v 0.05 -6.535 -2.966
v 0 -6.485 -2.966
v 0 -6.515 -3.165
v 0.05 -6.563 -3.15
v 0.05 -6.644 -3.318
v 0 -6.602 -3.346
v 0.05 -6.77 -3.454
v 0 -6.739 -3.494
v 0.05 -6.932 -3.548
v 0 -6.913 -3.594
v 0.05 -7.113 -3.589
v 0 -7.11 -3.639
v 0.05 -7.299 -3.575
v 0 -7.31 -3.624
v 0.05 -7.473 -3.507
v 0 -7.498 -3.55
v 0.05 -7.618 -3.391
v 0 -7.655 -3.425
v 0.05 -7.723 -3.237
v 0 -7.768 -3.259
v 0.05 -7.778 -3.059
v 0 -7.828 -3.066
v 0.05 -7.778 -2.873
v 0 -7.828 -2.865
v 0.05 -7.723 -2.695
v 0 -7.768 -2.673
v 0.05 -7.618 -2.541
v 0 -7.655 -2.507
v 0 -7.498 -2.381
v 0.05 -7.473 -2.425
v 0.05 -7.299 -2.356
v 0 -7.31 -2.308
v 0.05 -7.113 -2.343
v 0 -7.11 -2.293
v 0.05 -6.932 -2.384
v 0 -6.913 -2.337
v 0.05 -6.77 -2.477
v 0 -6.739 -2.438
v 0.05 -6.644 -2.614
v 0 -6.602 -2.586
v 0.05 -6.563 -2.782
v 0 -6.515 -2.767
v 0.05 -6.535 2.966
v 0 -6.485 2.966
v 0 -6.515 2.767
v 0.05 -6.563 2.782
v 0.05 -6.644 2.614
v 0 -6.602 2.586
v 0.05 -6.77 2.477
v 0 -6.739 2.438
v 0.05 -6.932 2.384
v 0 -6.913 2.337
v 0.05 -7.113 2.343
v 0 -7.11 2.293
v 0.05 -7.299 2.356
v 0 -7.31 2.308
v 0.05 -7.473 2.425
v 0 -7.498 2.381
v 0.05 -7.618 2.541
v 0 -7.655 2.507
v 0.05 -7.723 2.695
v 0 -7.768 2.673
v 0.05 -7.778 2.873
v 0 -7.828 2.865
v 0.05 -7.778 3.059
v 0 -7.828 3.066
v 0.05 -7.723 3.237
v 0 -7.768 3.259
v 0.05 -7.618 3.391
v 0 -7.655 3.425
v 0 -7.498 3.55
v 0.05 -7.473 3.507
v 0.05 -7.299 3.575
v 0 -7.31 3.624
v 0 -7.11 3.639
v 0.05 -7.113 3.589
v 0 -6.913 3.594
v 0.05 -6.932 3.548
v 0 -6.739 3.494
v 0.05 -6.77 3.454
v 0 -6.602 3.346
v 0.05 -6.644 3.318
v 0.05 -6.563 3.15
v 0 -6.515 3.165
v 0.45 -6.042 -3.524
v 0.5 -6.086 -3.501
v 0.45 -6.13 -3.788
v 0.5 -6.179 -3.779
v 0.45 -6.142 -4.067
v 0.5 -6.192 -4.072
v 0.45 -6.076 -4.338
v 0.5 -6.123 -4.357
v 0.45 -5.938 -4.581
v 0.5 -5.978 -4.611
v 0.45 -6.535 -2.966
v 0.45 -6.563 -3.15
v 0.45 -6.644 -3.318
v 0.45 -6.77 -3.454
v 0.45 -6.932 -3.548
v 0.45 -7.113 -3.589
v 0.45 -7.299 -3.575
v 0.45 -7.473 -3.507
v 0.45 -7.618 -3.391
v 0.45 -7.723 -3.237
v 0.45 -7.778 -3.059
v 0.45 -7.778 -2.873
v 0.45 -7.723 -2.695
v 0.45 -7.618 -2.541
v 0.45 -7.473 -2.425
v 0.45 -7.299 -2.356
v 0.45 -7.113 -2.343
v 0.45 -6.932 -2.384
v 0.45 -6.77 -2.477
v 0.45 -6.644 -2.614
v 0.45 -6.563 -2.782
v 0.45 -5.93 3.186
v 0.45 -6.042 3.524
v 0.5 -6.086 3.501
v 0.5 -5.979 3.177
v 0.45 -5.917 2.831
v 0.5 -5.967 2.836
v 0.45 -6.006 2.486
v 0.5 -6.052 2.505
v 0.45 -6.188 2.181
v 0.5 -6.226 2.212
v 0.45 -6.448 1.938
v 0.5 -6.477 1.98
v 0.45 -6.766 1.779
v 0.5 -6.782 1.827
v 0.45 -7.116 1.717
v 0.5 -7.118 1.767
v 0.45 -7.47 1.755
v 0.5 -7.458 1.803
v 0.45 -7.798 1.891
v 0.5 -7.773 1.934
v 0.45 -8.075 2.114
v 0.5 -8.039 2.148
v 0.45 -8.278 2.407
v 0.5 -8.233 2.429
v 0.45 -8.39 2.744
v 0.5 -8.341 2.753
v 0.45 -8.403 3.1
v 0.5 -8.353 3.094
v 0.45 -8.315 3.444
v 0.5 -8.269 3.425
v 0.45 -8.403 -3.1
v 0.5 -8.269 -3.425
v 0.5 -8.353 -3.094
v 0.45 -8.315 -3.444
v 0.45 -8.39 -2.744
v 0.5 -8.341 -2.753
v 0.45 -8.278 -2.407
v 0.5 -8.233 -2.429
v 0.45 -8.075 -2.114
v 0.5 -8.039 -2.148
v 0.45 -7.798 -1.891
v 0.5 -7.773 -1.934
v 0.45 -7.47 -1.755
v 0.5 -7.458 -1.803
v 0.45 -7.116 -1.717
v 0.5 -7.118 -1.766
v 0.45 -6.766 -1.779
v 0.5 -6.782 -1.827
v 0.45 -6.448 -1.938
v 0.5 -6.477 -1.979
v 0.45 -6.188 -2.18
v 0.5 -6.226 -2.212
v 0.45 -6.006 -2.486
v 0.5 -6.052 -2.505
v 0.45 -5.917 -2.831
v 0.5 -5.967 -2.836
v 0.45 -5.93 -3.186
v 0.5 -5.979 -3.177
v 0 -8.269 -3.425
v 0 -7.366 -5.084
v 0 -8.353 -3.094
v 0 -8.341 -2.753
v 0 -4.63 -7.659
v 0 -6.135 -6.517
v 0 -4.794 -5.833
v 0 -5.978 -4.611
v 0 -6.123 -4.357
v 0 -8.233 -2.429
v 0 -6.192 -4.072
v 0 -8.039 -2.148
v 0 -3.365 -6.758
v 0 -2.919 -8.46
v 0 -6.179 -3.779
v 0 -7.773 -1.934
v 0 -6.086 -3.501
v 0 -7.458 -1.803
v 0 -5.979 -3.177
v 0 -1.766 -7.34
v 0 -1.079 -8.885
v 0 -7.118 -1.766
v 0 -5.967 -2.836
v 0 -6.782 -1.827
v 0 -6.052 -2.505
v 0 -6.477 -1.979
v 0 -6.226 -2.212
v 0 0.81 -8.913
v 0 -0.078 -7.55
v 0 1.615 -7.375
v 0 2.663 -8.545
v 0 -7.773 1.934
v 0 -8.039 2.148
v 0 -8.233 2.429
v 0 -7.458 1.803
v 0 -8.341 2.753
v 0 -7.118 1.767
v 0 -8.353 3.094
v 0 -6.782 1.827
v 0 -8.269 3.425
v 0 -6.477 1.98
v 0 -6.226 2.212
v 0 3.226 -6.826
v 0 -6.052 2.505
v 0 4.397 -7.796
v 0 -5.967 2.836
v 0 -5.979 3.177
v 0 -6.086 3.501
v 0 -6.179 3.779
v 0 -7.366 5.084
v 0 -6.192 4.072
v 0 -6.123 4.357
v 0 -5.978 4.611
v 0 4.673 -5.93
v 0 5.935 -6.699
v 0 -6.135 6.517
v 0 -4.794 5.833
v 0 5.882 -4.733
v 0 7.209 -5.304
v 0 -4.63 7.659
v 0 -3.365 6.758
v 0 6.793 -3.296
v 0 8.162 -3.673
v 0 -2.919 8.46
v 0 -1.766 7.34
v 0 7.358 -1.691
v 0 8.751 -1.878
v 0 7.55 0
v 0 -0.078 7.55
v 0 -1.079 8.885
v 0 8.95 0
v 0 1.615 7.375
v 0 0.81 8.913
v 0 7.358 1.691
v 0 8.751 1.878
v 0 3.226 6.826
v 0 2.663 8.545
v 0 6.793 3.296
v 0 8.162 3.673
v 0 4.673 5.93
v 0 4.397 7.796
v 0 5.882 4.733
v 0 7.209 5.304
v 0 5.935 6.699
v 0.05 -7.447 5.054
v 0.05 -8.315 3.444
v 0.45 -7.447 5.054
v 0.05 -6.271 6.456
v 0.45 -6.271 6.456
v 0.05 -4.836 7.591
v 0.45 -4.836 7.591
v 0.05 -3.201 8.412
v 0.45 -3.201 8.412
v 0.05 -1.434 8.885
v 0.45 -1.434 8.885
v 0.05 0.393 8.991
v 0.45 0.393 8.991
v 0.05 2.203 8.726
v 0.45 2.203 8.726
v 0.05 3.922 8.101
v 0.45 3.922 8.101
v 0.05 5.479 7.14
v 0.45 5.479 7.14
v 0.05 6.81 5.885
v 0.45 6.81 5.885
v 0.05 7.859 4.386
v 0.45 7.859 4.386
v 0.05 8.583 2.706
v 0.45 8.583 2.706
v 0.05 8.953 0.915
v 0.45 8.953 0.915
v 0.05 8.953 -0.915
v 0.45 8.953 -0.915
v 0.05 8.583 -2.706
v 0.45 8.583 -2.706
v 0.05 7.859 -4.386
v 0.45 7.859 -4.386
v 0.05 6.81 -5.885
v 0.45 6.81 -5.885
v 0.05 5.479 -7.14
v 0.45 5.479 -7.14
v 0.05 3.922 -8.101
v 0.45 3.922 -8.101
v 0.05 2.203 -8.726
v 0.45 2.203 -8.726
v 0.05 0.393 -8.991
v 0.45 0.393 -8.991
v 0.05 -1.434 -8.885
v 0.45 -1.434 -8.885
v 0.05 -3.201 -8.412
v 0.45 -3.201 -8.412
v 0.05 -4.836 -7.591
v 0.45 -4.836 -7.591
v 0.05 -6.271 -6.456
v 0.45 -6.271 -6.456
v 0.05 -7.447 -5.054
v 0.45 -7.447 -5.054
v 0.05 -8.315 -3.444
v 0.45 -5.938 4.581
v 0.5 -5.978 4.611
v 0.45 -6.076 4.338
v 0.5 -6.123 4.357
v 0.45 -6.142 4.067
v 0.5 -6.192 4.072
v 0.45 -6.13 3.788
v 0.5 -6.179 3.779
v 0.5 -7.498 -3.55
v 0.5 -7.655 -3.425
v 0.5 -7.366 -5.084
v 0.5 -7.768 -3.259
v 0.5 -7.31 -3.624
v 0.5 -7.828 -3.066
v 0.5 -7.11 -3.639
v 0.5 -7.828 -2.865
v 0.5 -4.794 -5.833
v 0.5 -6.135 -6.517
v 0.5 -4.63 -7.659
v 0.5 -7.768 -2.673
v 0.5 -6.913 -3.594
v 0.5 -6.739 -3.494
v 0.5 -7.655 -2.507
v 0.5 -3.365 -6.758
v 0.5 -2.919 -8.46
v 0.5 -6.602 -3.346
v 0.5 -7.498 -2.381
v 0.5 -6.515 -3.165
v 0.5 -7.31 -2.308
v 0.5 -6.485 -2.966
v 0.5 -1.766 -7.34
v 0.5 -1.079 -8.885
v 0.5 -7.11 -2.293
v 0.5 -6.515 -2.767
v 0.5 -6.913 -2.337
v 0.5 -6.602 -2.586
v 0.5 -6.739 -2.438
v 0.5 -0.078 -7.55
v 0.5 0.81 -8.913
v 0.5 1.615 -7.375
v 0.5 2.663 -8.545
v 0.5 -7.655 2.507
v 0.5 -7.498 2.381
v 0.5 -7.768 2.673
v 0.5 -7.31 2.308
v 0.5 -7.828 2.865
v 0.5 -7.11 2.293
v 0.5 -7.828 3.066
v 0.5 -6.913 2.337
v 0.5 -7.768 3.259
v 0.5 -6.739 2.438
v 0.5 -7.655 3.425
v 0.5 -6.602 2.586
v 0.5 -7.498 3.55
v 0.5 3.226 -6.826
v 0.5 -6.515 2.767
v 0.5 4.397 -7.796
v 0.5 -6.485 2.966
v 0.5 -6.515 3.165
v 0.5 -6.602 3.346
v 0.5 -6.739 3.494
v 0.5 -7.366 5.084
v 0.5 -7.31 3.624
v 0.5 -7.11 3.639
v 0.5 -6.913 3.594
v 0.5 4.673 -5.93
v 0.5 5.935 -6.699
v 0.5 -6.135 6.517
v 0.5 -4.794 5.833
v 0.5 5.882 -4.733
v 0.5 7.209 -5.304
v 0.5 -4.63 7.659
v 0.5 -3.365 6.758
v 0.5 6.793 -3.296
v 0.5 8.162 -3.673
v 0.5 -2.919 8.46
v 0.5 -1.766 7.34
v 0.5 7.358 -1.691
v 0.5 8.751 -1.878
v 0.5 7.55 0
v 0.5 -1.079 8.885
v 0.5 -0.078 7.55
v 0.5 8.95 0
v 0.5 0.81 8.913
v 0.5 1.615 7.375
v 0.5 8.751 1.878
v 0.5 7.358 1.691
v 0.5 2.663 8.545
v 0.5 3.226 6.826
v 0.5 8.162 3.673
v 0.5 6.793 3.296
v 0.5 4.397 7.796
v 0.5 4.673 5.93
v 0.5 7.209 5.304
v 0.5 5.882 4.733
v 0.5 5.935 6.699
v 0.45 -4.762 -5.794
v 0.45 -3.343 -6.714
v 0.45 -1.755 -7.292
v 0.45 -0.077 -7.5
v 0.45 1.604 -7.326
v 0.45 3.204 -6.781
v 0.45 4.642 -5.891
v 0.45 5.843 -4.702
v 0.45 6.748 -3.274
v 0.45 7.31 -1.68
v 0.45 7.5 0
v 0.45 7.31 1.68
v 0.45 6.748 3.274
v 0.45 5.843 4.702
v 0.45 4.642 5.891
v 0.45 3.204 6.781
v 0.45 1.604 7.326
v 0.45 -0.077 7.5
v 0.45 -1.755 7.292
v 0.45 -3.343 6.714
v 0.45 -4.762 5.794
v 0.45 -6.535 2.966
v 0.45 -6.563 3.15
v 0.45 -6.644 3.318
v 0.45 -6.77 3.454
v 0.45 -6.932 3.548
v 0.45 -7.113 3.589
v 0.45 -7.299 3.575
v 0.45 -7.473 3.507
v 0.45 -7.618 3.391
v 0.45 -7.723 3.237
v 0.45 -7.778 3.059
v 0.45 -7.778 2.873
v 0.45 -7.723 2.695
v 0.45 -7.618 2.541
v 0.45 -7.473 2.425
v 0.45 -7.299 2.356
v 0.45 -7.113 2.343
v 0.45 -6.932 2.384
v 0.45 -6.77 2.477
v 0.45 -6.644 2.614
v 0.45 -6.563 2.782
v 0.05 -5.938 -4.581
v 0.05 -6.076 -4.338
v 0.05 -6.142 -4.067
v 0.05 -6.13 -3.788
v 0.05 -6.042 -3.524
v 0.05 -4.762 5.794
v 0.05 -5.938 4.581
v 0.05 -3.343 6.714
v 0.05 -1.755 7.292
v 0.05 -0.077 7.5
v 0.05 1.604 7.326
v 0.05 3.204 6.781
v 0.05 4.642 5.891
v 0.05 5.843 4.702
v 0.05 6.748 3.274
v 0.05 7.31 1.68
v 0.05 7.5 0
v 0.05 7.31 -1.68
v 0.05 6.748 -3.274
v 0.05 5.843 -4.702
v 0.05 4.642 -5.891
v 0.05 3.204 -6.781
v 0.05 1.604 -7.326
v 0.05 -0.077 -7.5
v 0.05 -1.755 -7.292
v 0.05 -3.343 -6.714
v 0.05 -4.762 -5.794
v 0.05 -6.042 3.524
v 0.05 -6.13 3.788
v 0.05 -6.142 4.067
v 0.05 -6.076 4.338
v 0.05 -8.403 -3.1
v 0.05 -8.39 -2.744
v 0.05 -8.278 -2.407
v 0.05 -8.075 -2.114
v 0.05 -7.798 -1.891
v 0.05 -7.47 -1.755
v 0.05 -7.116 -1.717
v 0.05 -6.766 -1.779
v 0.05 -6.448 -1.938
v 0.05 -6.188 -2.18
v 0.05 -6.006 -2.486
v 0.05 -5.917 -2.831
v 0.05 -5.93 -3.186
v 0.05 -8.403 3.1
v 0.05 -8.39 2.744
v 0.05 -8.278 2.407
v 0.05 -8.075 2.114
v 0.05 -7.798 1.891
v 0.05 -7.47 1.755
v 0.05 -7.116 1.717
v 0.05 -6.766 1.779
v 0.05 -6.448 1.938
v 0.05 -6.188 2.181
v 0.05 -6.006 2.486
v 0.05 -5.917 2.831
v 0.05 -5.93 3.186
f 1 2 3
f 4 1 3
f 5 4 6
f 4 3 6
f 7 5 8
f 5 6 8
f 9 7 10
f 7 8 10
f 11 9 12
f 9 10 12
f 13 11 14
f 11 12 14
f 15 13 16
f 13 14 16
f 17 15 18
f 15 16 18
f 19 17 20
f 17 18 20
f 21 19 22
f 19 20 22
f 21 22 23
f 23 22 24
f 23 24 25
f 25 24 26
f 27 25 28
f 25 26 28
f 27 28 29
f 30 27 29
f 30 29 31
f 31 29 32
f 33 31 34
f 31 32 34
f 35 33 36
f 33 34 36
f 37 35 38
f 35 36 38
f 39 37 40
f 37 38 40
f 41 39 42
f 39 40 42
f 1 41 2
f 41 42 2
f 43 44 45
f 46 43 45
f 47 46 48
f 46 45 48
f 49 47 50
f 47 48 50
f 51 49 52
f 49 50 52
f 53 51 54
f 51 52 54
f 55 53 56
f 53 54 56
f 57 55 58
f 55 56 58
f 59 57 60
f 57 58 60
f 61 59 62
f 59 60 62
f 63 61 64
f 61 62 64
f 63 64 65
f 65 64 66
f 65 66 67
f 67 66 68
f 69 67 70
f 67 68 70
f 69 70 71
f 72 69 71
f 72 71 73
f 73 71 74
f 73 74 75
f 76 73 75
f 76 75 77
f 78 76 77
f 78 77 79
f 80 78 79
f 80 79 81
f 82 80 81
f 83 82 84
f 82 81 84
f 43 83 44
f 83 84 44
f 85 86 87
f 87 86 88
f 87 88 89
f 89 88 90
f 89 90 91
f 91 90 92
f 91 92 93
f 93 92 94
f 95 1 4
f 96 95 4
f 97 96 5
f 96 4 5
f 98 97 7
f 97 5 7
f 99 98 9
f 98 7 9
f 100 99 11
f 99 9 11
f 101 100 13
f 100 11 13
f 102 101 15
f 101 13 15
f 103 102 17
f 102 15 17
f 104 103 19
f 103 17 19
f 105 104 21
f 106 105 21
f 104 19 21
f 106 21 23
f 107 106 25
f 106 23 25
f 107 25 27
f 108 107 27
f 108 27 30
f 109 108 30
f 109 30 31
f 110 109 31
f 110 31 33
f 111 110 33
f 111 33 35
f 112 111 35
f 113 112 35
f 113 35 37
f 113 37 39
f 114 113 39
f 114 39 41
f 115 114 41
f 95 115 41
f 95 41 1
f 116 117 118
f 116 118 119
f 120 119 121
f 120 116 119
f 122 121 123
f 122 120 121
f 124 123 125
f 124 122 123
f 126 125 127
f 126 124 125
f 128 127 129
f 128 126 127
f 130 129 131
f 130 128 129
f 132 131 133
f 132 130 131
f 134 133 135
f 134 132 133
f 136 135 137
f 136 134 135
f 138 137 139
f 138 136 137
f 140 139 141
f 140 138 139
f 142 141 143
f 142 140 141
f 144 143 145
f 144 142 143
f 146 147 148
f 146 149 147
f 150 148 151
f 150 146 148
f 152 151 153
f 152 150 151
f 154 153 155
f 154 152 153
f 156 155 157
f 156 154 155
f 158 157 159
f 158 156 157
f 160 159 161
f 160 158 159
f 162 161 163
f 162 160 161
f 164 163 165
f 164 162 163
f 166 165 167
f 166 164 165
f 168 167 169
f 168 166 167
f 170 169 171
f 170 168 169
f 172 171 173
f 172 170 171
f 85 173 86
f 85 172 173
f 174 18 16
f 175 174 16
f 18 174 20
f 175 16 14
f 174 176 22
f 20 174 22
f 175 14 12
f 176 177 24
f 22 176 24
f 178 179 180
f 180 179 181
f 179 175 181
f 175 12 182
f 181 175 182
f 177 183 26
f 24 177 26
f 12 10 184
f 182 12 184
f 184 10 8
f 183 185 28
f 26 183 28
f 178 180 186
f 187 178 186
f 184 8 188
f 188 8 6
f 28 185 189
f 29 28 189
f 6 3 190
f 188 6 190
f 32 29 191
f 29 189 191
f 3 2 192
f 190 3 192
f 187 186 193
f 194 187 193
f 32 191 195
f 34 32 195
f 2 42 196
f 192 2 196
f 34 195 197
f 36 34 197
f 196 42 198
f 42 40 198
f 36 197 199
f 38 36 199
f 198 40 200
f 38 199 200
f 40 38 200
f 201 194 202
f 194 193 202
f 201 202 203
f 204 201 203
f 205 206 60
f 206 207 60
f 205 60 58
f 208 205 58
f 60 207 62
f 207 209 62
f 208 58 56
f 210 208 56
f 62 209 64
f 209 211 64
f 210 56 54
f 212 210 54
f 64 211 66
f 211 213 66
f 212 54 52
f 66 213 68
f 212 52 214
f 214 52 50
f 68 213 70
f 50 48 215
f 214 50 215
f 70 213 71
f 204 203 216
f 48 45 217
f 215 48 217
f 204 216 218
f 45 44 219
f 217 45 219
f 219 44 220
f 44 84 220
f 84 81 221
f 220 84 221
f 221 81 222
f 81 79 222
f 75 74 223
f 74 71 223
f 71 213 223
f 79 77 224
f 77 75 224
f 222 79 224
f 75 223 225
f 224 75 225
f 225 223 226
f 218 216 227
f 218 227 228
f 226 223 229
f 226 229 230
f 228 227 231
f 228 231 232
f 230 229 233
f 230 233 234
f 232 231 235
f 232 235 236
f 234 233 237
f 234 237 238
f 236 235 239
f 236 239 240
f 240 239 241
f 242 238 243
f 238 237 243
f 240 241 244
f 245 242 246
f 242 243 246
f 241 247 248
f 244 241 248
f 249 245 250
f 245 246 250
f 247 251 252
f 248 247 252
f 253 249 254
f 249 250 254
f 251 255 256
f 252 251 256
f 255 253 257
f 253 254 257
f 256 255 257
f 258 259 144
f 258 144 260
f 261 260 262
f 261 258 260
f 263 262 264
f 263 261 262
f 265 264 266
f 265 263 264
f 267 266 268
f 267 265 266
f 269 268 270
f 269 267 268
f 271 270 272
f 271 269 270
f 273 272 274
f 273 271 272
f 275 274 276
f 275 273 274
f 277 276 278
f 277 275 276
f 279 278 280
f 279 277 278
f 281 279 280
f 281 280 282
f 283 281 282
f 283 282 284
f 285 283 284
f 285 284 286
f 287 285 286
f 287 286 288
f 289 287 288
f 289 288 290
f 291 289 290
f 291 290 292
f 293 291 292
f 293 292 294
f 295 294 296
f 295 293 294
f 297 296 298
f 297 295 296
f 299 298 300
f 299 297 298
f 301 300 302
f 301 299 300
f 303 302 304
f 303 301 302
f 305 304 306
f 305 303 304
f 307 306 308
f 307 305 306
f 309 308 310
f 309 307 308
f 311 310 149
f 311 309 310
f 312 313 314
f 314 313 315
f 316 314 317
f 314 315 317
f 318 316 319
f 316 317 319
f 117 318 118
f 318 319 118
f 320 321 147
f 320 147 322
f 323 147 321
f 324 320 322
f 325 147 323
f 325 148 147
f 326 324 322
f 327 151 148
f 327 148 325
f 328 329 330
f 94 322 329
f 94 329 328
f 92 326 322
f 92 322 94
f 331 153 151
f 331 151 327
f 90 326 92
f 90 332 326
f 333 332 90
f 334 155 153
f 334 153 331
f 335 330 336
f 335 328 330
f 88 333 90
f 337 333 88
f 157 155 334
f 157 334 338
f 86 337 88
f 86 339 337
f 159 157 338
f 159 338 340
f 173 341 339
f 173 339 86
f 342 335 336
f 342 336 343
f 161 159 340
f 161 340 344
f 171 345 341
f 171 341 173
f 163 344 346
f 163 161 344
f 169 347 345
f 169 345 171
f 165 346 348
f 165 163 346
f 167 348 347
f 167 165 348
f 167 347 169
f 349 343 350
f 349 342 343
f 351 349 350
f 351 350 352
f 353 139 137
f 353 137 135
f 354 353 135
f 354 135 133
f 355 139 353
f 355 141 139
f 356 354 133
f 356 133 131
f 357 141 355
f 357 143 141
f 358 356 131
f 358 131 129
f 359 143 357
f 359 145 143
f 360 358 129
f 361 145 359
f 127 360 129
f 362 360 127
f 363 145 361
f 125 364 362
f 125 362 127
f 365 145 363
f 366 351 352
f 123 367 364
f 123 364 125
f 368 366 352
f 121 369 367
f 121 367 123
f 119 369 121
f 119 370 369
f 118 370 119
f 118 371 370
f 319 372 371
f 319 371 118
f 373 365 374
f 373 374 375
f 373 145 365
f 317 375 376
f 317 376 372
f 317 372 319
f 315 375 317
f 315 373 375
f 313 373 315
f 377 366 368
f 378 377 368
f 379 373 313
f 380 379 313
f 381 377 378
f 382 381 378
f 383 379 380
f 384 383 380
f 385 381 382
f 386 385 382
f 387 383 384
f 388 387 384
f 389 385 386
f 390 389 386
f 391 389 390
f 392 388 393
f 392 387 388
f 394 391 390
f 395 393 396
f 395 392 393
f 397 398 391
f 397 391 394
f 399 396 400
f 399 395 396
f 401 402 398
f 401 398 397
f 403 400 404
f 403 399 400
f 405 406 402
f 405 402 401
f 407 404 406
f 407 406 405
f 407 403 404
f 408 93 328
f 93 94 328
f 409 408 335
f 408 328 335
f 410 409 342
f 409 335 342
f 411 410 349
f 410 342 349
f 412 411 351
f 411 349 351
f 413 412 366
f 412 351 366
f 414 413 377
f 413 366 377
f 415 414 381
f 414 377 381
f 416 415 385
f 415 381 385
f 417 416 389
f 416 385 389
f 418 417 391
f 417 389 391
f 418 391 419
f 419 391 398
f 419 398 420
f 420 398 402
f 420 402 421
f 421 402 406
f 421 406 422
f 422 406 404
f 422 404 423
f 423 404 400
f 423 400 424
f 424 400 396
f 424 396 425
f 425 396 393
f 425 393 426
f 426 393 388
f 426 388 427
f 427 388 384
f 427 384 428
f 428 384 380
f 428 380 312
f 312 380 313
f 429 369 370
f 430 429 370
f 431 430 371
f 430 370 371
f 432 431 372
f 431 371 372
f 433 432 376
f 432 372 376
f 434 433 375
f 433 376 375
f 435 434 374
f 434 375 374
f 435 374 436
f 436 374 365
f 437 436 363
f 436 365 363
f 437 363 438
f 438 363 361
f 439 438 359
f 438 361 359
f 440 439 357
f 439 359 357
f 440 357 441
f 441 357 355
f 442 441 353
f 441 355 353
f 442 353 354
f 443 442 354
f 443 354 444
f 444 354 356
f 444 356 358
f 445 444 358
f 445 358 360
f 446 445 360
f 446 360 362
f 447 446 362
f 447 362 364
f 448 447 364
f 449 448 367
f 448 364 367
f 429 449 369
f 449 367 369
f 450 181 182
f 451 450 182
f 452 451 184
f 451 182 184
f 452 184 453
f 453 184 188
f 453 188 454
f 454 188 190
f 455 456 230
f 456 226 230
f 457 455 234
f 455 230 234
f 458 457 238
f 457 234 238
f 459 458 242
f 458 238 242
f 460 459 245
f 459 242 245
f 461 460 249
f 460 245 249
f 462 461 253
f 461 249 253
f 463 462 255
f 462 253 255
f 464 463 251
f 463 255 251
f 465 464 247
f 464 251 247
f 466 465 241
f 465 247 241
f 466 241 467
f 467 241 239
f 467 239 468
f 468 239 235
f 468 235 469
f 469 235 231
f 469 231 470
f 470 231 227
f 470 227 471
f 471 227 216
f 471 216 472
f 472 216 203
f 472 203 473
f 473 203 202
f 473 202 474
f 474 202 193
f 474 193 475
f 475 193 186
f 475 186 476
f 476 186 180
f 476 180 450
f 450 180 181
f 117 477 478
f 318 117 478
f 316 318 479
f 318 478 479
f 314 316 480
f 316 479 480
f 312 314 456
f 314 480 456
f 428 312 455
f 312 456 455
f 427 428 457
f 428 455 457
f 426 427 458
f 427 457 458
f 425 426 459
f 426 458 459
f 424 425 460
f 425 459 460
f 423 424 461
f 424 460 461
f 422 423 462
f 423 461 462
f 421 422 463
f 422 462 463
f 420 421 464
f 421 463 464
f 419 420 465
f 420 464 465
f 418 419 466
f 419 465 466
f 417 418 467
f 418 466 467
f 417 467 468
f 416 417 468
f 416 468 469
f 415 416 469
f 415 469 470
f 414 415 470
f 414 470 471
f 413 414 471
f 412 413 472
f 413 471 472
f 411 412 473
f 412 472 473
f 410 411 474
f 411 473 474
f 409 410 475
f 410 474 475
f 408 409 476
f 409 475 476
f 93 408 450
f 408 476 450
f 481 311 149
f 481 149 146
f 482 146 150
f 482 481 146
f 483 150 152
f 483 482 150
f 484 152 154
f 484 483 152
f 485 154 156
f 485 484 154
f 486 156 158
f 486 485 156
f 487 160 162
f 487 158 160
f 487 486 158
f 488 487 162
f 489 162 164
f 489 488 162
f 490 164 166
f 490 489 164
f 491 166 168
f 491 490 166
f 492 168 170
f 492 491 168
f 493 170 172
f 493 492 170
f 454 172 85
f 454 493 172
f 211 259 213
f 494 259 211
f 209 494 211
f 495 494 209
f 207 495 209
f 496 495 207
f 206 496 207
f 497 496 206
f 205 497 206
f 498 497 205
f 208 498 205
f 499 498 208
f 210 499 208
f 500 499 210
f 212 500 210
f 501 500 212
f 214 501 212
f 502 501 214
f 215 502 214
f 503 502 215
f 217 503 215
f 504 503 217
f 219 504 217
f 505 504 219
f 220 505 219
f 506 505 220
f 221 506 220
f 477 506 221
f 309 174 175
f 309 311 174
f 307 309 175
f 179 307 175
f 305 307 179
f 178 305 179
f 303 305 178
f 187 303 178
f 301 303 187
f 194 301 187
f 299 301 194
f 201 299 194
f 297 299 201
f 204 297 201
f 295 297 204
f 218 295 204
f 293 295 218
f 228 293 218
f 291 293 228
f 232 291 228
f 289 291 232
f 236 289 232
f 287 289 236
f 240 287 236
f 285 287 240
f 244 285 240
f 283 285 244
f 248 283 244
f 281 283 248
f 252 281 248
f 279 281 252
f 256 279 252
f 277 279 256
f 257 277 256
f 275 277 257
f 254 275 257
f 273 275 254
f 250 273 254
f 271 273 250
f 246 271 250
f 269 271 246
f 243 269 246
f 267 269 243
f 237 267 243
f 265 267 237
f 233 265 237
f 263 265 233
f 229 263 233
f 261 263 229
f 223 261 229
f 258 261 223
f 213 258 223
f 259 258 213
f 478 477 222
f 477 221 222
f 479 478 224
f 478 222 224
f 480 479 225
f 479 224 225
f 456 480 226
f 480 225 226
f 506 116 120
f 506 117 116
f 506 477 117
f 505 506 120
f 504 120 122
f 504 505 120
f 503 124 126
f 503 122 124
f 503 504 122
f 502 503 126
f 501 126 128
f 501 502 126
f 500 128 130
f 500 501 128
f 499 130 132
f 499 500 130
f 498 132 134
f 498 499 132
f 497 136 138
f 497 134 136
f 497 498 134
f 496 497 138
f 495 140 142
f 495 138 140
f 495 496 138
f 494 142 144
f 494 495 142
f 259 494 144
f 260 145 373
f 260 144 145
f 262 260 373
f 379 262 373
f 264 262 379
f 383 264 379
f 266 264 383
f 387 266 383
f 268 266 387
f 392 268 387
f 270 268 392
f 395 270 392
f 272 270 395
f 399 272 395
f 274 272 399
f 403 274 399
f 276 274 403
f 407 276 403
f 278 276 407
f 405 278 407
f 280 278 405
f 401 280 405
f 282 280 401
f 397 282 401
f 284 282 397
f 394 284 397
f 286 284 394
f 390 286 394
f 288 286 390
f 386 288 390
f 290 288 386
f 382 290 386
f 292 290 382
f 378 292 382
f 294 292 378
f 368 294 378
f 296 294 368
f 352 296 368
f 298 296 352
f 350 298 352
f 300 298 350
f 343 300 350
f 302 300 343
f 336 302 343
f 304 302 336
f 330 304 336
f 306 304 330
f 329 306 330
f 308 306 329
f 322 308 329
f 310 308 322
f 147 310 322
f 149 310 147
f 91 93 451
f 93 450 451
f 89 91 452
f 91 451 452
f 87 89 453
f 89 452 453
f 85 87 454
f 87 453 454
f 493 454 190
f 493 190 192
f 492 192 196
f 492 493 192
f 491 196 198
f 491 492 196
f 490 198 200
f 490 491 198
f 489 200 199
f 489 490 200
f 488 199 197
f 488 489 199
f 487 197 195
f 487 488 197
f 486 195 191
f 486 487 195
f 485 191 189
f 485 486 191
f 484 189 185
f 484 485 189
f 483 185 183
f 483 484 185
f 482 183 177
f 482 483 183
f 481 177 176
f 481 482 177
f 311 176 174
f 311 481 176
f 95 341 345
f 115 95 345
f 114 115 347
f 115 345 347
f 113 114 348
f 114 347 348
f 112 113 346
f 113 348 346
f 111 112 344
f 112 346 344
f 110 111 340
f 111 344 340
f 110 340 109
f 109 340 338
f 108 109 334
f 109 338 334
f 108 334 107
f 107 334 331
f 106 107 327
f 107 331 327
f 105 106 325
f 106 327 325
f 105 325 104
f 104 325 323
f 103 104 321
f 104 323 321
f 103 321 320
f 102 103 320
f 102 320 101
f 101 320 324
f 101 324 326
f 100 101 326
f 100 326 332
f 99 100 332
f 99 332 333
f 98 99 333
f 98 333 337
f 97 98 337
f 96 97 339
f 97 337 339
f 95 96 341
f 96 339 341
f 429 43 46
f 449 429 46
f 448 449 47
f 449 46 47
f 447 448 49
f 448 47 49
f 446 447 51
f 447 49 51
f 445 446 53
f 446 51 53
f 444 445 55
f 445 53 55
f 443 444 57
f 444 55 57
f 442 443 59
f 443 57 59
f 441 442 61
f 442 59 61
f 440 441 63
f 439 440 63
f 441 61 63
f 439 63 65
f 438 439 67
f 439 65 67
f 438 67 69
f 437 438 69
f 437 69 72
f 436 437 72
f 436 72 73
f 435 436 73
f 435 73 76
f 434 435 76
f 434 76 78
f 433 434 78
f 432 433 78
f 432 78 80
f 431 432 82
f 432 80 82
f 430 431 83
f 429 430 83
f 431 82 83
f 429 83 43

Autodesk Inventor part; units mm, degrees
ref_plane "YZ Plane" through (0, 0, 0) normal (1, 0, 0) x (0, 1, 0)
ref_plane "XZ Plane" through (0, 0, 0) normal (0, 1, 0) x (-1, 0, 0)
ref_plane "XY Plane" through (0, 0, 0) normal (0, 0, 1) x (1, 0, 0)
sketch "Szkic1" plane through (0, 0, 0) normal (1, 0, 0) x (0, 1, 0)
  arc A0 (-8.3149, -3.4442) -> (-8.3149, 3.4442) centre (0, 0) ccw
  arc A1 (-6.9291, -2.8701) -> (-6.694, -3.3823) centre (0, 0) ccw construction
  line L0 (0, 0) -> (-6.5826, 2.7266)
  line L1 (0, 0) -> (-6.5826, -2.7266)
  line L2 (-11.9129, 0) -> (12.4855, 0) projected
  circle A2 centre (-7.1601, 2.9658) radius 0.625
  line L3 (-6.9291, 2.8701) -> (-7.1601, 2.9658) construction
  arc A3 (-8.3149, 3.4442) -> (-6.0415, 3.5238) centre (-7.1601, 2.9658) ccw
  circle A4 centre (-7.1601, -2.9658) radius 0.625
  arc A5 (-6.3801, -3.9426) -> (-6.0415, -3.5238) centre (-7.1601, -2.9658) ccw construction
  arc A6 (-6.694, -3.3823) -> (-6.3801, -3.9426) centre (0, 0) ccw construction
  arc A7 (-6.3801, -3.9426) -> (-5.9385, -4.5809) centre (0, 0) ccw construction
  arc A8 (-6.694, 3.3823) -> (-6.9291, 2.8701) centre (0, 0) ccw construction
  line L4 (-6.5826, 2.7266) -> (-8.3149, 3.4442) construction
  line L5 (-6.5826, -2.7266) -> (-8.3149, -3.4442) construction
  arc A9 (-6.3801, 3.9426) -> (-6.694, 3.3823) centre (0, 0) ccw construction
  arc A10 (-5.9385, 4.5809) -> (-6.0415, 3.5238) centre (-5.1467, 3.9701) ccw
  arc A11 (-6.0415, -3.5238) -> (-5.9385, -4.5809) centre (-5.1467, -3.9701) ccw
  arc A12 (-5.9385, 4.5809) -> (-6.3801, 3.9426) centre (0, 0) ccw construction
  arc A13 (-6.0415, 3.5238) -> (-6.3801, 3.9426) centre (-7.1601, 2.9658) ccw construction
  arc A14 (-6.0415, -3.5238) -> (-8.3149, -3.4442) centre (-7.1601, -2.9658) ccw
  arc A15 (-5.9385, -4.5809) -> (-5.9385, 4.5809) centre (0, 0) ccw
  dimension "d0" = 18
  dimension "d1" = 15
  dimension "d2" = 45
  dimension "d3" = 1.25
  dimension "d4" = 0.25
  dimension "d5" = 2
extrude "Wyciągnięcie proste1" add sketch "Szkic1" along normal blind 0.5 contours A14 A11 A15 L2 A0 | L2 A15 A10 A3 A0
chamfer "Faza1" distance 0.05 angle 45 16 edges at (0.5, 7.5, 0) (0.5, -6.1419, -4.0672) (0.5, -7.1163, -1.7166) (0.5, 9, 0) (0.5, -7.1163, 1.7166) (0.5, -6.1419, 4.0672) (0, 7.5, 0) (0, -6.1419, -4.0672) (0, -7.1163, -1.7166) (0, 9, 0) (0, -7.1163, 1.7166) (0, -6.1419, 4.0672) (0, -7.7851, 2.9658) (0.5, -7.7851, 2.9658) (0, -7.7851, -2.9658) (0.5, -7.7851, -2.9658)
properties part number "Seger"
